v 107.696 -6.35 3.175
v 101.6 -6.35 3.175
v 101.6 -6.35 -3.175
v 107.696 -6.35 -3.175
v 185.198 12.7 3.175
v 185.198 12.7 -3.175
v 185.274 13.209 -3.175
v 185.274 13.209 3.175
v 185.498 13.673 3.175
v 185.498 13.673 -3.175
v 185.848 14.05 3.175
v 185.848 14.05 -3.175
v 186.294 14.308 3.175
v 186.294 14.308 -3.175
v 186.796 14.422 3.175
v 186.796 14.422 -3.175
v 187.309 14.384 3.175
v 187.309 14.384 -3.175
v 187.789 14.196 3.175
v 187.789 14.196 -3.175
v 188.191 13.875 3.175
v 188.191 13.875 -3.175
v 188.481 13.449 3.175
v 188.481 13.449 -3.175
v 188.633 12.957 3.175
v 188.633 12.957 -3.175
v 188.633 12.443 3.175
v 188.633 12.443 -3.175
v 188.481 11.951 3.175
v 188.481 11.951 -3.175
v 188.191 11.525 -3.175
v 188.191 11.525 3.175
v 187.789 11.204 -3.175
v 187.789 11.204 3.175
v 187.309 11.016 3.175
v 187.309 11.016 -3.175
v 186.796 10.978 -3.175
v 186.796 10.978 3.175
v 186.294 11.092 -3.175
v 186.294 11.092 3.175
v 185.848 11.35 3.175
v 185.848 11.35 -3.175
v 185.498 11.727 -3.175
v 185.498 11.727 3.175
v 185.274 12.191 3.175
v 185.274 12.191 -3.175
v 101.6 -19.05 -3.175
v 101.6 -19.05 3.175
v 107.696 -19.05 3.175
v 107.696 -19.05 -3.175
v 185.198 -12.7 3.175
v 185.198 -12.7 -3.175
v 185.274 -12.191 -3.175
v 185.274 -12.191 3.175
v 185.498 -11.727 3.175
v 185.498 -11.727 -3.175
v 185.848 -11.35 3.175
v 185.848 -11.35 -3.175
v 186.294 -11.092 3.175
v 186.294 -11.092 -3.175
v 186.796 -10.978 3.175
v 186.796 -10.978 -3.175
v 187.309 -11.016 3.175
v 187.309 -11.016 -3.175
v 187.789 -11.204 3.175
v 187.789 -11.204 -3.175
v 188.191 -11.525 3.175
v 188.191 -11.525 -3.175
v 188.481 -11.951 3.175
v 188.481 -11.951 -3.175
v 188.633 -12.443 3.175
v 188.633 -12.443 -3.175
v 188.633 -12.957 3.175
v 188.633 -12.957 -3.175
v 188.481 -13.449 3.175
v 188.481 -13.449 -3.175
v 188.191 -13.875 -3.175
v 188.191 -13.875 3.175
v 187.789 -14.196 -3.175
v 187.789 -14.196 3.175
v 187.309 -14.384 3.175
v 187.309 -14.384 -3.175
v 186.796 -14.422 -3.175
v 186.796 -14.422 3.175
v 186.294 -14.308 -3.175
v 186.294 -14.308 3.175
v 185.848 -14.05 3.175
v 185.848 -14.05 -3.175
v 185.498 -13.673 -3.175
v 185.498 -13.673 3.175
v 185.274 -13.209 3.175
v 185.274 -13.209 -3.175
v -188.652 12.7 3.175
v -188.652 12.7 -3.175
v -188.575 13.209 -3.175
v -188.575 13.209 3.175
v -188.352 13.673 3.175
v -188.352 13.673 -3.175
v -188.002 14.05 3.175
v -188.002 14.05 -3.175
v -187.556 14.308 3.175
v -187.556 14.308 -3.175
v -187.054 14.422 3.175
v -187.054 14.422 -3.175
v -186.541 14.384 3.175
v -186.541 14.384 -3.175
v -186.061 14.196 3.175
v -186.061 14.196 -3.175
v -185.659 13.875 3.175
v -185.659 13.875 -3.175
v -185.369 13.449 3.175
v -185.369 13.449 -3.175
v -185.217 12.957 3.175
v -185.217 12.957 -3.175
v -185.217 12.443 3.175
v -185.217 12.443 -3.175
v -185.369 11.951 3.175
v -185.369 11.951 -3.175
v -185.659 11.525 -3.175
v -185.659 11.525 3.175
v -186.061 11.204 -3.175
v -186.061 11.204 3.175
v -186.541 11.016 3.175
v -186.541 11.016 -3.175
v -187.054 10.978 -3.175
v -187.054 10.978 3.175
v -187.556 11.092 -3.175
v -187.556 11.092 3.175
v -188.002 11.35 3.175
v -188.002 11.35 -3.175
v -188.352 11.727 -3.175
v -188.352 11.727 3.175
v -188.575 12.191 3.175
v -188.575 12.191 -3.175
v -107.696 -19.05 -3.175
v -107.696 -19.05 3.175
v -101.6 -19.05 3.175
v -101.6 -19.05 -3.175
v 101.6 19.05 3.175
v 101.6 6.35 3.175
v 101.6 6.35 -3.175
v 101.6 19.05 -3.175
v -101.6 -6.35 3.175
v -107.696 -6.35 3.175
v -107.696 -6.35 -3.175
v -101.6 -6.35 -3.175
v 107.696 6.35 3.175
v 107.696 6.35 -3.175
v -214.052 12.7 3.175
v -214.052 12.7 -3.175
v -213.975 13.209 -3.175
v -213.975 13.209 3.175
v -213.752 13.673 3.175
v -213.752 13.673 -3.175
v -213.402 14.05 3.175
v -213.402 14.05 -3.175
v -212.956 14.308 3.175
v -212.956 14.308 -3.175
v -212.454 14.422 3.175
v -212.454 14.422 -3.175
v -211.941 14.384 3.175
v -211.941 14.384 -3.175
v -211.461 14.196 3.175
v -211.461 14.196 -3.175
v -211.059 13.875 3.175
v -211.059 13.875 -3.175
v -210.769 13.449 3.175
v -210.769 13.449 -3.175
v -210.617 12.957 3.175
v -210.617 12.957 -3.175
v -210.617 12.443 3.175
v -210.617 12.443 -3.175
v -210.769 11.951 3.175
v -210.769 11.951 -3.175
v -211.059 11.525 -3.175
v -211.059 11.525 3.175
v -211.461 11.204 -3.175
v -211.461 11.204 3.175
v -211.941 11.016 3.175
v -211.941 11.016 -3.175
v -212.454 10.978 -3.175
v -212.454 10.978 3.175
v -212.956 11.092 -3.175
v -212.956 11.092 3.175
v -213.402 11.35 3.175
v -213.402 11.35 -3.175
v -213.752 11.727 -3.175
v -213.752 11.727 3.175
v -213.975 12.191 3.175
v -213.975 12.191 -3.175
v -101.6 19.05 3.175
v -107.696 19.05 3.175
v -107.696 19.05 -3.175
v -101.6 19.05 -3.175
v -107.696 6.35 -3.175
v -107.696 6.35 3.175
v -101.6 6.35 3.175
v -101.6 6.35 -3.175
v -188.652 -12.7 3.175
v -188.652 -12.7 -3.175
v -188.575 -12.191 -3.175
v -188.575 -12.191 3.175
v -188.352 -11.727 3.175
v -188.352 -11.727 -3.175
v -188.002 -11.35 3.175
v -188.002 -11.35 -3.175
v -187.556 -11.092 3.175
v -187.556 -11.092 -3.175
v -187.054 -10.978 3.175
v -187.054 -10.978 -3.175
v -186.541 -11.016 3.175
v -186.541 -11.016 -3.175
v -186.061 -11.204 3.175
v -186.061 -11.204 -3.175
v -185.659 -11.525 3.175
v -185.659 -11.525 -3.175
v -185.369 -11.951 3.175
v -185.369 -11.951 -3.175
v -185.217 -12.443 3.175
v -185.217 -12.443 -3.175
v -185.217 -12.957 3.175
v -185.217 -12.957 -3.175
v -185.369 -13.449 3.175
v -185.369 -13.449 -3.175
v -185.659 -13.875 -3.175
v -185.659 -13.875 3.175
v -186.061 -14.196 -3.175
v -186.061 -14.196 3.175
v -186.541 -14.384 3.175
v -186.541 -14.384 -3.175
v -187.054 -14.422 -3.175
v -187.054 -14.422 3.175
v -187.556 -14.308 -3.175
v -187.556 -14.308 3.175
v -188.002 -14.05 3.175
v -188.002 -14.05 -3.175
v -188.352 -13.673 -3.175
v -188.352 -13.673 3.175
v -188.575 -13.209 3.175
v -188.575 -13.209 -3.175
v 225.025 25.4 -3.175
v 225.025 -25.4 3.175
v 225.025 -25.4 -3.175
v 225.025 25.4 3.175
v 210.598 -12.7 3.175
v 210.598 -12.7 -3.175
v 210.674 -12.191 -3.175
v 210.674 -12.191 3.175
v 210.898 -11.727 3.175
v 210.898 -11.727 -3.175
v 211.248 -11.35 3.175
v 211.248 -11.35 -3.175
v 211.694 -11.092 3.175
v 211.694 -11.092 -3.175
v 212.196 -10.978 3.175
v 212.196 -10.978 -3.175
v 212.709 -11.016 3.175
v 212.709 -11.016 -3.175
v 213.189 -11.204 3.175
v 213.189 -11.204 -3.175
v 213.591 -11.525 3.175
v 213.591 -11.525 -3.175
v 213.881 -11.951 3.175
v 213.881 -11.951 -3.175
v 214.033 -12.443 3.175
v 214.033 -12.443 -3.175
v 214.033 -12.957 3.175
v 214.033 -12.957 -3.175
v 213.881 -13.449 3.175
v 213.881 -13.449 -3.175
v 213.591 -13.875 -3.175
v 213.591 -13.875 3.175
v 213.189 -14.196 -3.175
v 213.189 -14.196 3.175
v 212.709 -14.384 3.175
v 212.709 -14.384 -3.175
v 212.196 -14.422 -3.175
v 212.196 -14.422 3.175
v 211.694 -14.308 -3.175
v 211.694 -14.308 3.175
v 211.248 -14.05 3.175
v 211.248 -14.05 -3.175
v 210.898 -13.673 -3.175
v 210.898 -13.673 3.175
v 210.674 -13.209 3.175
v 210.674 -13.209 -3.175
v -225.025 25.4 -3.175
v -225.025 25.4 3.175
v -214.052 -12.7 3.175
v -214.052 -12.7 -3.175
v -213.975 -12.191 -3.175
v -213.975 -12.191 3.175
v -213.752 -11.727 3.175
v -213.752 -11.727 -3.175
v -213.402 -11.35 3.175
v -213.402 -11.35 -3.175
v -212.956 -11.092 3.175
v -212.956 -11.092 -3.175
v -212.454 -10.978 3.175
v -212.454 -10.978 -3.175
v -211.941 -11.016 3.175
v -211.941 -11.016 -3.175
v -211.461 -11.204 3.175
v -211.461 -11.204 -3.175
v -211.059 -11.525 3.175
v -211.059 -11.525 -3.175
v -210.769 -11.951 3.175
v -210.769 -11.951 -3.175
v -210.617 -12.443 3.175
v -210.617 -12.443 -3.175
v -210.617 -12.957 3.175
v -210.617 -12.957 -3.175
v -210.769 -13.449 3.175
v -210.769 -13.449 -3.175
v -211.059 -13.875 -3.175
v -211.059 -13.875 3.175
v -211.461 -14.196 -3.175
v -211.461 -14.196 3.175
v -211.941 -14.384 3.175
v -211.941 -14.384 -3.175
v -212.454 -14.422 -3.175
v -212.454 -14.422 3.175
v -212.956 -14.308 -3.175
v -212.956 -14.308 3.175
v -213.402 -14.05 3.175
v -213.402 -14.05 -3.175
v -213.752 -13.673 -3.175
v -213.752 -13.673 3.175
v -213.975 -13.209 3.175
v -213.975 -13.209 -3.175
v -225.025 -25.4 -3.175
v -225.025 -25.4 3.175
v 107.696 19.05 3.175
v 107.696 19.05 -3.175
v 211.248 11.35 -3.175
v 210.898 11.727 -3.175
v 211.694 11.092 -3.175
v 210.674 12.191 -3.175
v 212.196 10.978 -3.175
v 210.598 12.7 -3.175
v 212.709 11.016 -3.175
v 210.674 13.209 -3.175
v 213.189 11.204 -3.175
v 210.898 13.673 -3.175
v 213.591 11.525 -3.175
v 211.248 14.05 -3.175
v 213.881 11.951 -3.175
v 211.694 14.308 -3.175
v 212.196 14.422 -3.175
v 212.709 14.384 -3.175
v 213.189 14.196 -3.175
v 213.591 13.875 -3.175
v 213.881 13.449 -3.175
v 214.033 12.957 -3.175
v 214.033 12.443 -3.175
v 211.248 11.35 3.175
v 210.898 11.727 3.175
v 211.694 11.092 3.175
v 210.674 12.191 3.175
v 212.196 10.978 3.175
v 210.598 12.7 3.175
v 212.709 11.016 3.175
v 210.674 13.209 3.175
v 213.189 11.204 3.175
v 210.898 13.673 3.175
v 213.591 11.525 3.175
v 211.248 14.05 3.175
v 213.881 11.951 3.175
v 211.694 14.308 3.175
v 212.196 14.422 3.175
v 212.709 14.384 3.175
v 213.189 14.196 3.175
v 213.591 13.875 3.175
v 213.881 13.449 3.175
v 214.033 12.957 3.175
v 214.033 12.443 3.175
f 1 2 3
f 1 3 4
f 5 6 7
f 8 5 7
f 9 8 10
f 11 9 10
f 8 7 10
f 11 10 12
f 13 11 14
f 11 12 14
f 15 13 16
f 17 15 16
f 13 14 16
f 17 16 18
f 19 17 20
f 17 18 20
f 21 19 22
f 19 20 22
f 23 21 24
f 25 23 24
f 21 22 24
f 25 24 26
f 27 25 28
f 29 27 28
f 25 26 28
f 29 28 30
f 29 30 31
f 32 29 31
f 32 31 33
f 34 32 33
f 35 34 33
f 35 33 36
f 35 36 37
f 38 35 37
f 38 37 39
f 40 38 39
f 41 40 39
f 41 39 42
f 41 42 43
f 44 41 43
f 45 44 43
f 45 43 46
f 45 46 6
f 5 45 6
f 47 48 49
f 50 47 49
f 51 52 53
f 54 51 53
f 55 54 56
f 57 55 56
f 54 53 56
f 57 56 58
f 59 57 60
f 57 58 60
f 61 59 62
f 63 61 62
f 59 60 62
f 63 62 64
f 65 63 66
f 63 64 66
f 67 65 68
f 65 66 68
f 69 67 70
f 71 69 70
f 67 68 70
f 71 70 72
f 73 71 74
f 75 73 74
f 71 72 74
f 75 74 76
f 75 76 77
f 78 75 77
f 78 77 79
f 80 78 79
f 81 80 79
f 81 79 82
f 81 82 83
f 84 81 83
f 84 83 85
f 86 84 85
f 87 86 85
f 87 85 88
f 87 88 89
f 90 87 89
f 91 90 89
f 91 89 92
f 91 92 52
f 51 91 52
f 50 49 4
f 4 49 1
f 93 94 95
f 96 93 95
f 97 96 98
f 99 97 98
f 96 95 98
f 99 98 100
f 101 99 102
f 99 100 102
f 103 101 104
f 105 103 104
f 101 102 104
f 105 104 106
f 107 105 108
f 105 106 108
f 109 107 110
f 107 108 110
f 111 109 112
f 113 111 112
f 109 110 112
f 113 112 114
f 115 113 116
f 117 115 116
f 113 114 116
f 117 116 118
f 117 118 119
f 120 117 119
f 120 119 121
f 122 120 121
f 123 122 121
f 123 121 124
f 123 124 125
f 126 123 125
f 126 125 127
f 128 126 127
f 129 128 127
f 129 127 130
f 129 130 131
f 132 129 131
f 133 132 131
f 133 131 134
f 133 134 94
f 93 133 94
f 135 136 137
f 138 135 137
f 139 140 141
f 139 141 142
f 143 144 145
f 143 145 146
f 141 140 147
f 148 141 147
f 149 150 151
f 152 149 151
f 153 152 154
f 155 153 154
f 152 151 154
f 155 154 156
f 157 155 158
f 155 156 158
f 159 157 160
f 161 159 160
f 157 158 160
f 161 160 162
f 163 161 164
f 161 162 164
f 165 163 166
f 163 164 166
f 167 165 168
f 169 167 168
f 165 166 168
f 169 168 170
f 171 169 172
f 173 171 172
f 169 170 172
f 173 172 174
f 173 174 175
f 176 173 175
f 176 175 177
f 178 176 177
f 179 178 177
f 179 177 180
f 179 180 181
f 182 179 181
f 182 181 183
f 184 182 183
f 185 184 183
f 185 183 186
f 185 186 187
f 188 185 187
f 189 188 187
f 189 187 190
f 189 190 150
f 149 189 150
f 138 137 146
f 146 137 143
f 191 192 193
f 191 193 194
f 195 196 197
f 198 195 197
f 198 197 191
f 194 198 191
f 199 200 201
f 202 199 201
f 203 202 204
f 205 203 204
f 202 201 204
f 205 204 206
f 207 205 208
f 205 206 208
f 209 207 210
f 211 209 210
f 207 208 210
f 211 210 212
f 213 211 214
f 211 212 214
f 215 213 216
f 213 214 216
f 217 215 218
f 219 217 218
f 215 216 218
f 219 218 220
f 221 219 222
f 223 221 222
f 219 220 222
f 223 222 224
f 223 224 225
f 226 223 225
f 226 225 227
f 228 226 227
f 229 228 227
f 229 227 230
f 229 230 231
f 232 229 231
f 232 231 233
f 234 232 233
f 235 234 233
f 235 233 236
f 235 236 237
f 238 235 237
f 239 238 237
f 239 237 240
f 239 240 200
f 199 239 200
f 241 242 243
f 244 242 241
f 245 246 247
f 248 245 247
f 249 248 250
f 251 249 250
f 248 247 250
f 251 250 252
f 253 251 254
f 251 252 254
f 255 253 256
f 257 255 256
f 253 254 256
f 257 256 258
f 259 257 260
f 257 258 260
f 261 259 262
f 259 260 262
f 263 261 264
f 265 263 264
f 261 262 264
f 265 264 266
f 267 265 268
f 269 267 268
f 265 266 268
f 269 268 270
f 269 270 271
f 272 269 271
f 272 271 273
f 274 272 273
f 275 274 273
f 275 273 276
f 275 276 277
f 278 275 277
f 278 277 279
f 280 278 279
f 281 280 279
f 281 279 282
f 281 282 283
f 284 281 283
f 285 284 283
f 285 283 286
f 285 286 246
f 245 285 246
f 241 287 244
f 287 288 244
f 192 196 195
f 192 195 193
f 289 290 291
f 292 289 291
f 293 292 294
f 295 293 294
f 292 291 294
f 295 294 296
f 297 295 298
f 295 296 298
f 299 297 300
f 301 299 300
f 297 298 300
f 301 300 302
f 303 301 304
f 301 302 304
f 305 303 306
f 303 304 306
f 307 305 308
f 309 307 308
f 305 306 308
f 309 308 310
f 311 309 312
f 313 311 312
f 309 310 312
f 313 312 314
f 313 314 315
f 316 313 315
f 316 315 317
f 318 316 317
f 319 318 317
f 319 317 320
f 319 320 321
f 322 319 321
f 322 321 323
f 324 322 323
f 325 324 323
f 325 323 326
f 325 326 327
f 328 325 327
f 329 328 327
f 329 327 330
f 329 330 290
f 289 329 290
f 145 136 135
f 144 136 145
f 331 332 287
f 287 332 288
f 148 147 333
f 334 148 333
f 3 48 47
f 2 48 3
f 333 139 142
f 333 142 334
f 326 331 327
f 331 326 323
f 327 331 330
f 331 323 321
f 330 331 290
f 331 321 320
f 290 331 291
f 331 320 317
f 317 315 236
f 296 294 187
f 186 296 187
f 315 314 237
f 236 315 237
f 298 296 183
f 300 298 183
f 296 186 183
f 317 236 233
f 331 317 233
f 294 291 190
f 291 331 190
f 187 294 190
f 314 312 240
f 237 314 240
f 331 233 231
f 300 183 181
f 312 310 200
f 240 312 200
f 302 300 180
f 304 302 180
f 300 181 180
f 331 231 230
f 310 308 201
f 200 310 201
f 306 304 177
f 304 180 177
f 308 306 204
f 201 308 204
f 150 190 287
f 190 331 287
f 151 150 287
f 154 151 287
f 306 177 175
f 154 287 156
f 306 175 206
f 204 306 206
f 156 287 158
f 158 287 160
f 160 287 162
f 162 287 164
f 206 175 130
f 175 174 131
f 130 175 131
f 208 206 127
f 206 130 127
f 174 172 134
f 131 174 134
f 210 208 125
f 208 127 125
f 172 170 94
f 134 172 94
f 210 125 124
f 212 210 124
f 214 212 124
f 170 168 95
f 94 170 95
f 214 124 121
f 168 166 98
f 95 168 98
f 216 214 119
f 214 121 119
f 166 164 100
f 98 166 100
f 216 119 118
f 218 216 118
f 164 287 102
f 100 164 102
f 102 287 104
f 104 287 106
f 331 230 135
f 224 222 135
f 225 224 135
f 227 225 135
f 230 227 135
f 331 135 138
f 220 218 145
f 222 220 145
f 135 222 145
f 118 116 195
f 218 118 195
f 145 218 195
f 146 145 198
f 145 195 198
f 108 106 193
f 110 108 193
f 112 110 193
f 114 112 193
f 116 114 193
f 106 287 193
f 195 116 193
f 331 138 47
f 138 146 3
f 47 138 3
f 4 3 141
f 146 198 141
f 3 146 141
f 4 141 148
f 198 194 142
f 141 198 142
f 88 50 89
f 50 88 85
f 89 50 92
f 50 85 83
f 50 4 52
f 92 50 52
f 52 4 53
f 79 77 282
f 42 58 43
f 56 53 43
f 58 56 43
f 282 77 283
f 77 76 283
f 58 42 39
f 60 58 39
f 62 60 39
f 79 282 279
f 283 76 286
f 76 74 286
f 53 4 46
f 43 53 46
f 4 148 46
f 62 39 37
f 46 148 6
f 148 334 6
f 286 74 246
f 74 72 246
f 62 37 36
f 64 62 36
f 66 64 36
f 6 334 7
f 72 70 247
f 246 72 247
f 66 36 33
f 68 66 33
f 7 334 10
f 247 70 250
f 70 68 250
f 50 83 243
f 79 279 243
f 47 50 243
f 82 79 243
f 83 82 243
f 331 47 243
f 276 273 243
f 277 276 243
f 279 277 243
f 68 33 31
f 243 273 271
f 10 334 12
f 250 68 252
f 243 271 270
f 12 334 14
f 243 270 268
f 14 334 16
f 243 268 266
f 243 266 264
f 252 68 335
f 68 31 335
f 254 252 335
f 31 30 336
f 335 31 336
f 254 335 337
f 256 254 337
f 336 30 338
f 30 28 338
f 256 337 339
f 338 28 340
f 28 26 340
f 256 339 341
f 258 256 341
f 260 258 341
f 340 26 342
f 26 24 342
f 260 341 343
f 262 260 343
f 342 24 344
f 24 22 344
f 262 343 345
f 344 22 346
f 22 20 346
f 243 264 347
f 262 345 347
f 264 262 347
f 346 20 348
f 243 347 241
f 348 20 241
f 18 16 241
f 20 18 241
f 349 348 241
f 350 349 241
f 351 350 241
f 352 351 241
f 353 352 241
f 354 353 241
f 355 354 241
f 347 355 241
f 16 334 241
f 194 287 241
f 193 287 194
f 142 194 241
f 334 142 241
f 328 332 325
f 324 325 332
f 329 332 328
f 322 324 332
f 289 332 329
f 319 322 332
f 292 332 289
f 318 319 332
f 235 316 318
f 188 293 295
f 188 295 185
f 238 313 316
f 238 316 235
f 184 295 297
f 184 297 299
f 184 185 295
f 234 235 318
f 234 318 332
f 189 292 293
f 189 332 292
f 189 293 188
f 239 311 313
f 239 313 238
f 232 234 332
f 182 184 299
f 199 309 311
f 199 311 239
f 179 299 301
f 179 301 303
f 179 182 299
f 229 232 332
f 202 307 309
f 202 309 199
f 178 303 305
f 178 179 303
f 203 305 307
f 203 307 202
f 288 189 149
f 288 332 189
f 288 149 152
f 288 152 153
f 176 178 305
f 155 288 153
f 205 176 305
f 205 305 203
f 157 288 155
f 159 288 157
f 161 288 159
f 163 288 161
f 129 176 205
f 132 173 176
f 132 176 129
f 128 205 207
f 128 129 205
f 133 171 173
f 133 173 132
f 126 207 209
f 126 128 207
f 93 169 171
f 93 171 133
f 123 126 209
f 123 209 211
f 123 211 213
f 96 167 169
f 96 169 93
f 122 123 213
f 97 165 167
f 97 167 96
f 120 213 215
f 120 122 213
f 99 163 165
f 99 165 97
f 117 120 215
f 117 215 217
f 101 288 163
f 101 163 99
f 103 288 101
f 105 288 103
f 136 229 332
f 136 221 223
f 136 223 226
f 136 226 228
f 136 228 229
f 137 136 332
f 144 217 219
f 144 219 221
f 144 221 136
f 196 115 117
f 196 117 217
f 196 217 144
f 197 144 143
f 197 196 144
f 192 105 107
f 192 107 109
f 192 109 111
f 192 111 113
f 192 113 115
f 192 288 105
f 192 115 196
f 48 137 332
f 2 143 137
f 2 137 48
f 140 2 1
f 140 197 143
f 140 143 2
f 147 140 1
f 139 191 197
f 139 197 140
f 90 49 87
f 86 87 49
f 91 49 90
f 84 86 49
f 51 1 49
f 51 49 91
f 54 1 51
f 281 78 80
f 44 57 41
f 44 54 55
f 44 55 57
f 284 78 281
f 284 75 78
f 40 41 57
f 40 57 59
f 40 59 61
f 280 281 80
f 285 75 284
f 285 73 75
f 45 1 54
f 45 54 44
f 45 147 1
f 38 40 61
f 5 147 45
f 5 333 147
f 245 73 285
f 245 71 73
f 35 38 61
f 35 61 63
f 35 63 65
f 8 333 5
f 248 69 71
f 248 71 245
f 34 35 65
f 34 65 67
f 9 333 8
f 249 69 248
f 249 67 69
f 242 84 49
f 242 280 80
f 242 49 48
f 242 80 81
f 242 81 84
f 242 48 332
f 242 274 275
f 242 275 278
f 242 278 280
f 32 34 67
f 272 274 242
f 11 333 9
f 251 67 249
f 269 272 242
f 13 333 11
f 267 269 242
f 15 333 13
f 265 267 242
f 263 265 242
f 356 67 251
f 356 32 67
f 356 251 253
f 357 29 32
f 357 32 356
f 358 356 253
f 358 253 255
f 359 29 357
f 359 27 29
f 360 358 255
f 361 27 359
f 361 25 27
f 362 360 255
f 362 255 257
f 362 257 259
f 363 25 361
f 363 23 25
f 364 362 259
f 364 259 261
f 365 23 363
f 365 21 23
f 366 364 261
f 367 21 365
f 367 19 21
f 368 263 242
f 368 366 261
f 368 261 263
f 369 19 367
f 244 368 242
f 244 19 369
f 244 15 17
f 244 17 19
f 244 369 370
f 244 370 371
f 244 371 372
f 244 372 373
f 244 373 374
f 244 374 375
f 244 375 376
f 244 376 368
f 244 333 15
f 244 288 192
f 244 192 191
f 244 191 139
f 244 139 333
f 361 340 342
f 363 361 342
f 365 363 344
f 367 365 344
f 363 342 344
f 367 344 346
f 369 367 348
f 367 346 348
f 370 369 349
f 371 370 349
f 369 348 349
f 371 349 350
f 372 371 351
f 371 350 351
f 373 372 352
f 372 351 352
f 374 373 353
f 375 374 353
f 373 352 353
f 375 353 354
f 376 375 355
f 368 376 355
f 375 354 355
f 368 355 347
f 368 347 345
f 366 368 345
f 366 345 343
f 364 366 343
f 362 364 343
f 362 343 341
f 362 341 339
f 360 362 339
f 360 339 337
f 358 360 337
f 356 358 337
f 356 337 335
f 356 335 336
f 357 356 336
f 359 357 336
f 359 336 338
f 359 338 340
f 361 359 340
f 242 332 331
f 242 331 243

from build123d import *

# Parameters (mm, degrees)
SKETCH2_W             = 450.0499
SKETCH2_H             = 50.8
BOSS_EXTRUDE1_DEPTH   = 3.175
F_8_32_TAPPED_HOLE1_D = 3.4544
SKETCH5_W             = 6.096
SKETCH5_H             = 12.7
CUT_EXTRUDE1_DEPTH    = 227.542955358


with BuildPart() as part:
    # Sketch2 → Boss-Extrude1 (new, symmetric)
    with BuildSketch(Plane.XY):
        Rectangle(SKETCH2_W, SKETCH2_H)
    extrude(amount=BOSS_EXTRUDE1_DEPTH, both=True)

    # #8-32 Tapped Hole1 (through all)
    with Locations(Plane.XY.offset(3.175)):
        with Locations((-212.32495, 12.7), (-212.32495, -12.7), (212.32495, 12.7), (212.32495, -12.7), (-186.92495, 12.7), (-186.92495, -12.7), (186.92495, 12.7), (186.92495, -12.7)):
            Hole(F_8_32_TAPPED_HOLE1_D / 2)

    # Sketch5 → Cut-Extrude1 (cut, through all)
    with BuildSketch(Plane.XY.offset(3.175)):
        with Locations((-104.648, 12.7)):
            Rectangle(SKETCH5_W, SKETCH5_H)
        with Locations((-104.648, -12.7)):
            Rectangle(SKETCH5_W, SKETCH5_H)
        with Locations((104.648, 12.7)):
            Rectangle(SKETCH5_W, SKETCH5_H)
        with Locations((104.648, -12.7)):
            Rectangle(SKETCH5_W, SKETCH5_H)
    extrude(amount=-CUT_EXTRUDE1_DEPTH, mode=Mode.SUBTRACT)


solid = part.part
